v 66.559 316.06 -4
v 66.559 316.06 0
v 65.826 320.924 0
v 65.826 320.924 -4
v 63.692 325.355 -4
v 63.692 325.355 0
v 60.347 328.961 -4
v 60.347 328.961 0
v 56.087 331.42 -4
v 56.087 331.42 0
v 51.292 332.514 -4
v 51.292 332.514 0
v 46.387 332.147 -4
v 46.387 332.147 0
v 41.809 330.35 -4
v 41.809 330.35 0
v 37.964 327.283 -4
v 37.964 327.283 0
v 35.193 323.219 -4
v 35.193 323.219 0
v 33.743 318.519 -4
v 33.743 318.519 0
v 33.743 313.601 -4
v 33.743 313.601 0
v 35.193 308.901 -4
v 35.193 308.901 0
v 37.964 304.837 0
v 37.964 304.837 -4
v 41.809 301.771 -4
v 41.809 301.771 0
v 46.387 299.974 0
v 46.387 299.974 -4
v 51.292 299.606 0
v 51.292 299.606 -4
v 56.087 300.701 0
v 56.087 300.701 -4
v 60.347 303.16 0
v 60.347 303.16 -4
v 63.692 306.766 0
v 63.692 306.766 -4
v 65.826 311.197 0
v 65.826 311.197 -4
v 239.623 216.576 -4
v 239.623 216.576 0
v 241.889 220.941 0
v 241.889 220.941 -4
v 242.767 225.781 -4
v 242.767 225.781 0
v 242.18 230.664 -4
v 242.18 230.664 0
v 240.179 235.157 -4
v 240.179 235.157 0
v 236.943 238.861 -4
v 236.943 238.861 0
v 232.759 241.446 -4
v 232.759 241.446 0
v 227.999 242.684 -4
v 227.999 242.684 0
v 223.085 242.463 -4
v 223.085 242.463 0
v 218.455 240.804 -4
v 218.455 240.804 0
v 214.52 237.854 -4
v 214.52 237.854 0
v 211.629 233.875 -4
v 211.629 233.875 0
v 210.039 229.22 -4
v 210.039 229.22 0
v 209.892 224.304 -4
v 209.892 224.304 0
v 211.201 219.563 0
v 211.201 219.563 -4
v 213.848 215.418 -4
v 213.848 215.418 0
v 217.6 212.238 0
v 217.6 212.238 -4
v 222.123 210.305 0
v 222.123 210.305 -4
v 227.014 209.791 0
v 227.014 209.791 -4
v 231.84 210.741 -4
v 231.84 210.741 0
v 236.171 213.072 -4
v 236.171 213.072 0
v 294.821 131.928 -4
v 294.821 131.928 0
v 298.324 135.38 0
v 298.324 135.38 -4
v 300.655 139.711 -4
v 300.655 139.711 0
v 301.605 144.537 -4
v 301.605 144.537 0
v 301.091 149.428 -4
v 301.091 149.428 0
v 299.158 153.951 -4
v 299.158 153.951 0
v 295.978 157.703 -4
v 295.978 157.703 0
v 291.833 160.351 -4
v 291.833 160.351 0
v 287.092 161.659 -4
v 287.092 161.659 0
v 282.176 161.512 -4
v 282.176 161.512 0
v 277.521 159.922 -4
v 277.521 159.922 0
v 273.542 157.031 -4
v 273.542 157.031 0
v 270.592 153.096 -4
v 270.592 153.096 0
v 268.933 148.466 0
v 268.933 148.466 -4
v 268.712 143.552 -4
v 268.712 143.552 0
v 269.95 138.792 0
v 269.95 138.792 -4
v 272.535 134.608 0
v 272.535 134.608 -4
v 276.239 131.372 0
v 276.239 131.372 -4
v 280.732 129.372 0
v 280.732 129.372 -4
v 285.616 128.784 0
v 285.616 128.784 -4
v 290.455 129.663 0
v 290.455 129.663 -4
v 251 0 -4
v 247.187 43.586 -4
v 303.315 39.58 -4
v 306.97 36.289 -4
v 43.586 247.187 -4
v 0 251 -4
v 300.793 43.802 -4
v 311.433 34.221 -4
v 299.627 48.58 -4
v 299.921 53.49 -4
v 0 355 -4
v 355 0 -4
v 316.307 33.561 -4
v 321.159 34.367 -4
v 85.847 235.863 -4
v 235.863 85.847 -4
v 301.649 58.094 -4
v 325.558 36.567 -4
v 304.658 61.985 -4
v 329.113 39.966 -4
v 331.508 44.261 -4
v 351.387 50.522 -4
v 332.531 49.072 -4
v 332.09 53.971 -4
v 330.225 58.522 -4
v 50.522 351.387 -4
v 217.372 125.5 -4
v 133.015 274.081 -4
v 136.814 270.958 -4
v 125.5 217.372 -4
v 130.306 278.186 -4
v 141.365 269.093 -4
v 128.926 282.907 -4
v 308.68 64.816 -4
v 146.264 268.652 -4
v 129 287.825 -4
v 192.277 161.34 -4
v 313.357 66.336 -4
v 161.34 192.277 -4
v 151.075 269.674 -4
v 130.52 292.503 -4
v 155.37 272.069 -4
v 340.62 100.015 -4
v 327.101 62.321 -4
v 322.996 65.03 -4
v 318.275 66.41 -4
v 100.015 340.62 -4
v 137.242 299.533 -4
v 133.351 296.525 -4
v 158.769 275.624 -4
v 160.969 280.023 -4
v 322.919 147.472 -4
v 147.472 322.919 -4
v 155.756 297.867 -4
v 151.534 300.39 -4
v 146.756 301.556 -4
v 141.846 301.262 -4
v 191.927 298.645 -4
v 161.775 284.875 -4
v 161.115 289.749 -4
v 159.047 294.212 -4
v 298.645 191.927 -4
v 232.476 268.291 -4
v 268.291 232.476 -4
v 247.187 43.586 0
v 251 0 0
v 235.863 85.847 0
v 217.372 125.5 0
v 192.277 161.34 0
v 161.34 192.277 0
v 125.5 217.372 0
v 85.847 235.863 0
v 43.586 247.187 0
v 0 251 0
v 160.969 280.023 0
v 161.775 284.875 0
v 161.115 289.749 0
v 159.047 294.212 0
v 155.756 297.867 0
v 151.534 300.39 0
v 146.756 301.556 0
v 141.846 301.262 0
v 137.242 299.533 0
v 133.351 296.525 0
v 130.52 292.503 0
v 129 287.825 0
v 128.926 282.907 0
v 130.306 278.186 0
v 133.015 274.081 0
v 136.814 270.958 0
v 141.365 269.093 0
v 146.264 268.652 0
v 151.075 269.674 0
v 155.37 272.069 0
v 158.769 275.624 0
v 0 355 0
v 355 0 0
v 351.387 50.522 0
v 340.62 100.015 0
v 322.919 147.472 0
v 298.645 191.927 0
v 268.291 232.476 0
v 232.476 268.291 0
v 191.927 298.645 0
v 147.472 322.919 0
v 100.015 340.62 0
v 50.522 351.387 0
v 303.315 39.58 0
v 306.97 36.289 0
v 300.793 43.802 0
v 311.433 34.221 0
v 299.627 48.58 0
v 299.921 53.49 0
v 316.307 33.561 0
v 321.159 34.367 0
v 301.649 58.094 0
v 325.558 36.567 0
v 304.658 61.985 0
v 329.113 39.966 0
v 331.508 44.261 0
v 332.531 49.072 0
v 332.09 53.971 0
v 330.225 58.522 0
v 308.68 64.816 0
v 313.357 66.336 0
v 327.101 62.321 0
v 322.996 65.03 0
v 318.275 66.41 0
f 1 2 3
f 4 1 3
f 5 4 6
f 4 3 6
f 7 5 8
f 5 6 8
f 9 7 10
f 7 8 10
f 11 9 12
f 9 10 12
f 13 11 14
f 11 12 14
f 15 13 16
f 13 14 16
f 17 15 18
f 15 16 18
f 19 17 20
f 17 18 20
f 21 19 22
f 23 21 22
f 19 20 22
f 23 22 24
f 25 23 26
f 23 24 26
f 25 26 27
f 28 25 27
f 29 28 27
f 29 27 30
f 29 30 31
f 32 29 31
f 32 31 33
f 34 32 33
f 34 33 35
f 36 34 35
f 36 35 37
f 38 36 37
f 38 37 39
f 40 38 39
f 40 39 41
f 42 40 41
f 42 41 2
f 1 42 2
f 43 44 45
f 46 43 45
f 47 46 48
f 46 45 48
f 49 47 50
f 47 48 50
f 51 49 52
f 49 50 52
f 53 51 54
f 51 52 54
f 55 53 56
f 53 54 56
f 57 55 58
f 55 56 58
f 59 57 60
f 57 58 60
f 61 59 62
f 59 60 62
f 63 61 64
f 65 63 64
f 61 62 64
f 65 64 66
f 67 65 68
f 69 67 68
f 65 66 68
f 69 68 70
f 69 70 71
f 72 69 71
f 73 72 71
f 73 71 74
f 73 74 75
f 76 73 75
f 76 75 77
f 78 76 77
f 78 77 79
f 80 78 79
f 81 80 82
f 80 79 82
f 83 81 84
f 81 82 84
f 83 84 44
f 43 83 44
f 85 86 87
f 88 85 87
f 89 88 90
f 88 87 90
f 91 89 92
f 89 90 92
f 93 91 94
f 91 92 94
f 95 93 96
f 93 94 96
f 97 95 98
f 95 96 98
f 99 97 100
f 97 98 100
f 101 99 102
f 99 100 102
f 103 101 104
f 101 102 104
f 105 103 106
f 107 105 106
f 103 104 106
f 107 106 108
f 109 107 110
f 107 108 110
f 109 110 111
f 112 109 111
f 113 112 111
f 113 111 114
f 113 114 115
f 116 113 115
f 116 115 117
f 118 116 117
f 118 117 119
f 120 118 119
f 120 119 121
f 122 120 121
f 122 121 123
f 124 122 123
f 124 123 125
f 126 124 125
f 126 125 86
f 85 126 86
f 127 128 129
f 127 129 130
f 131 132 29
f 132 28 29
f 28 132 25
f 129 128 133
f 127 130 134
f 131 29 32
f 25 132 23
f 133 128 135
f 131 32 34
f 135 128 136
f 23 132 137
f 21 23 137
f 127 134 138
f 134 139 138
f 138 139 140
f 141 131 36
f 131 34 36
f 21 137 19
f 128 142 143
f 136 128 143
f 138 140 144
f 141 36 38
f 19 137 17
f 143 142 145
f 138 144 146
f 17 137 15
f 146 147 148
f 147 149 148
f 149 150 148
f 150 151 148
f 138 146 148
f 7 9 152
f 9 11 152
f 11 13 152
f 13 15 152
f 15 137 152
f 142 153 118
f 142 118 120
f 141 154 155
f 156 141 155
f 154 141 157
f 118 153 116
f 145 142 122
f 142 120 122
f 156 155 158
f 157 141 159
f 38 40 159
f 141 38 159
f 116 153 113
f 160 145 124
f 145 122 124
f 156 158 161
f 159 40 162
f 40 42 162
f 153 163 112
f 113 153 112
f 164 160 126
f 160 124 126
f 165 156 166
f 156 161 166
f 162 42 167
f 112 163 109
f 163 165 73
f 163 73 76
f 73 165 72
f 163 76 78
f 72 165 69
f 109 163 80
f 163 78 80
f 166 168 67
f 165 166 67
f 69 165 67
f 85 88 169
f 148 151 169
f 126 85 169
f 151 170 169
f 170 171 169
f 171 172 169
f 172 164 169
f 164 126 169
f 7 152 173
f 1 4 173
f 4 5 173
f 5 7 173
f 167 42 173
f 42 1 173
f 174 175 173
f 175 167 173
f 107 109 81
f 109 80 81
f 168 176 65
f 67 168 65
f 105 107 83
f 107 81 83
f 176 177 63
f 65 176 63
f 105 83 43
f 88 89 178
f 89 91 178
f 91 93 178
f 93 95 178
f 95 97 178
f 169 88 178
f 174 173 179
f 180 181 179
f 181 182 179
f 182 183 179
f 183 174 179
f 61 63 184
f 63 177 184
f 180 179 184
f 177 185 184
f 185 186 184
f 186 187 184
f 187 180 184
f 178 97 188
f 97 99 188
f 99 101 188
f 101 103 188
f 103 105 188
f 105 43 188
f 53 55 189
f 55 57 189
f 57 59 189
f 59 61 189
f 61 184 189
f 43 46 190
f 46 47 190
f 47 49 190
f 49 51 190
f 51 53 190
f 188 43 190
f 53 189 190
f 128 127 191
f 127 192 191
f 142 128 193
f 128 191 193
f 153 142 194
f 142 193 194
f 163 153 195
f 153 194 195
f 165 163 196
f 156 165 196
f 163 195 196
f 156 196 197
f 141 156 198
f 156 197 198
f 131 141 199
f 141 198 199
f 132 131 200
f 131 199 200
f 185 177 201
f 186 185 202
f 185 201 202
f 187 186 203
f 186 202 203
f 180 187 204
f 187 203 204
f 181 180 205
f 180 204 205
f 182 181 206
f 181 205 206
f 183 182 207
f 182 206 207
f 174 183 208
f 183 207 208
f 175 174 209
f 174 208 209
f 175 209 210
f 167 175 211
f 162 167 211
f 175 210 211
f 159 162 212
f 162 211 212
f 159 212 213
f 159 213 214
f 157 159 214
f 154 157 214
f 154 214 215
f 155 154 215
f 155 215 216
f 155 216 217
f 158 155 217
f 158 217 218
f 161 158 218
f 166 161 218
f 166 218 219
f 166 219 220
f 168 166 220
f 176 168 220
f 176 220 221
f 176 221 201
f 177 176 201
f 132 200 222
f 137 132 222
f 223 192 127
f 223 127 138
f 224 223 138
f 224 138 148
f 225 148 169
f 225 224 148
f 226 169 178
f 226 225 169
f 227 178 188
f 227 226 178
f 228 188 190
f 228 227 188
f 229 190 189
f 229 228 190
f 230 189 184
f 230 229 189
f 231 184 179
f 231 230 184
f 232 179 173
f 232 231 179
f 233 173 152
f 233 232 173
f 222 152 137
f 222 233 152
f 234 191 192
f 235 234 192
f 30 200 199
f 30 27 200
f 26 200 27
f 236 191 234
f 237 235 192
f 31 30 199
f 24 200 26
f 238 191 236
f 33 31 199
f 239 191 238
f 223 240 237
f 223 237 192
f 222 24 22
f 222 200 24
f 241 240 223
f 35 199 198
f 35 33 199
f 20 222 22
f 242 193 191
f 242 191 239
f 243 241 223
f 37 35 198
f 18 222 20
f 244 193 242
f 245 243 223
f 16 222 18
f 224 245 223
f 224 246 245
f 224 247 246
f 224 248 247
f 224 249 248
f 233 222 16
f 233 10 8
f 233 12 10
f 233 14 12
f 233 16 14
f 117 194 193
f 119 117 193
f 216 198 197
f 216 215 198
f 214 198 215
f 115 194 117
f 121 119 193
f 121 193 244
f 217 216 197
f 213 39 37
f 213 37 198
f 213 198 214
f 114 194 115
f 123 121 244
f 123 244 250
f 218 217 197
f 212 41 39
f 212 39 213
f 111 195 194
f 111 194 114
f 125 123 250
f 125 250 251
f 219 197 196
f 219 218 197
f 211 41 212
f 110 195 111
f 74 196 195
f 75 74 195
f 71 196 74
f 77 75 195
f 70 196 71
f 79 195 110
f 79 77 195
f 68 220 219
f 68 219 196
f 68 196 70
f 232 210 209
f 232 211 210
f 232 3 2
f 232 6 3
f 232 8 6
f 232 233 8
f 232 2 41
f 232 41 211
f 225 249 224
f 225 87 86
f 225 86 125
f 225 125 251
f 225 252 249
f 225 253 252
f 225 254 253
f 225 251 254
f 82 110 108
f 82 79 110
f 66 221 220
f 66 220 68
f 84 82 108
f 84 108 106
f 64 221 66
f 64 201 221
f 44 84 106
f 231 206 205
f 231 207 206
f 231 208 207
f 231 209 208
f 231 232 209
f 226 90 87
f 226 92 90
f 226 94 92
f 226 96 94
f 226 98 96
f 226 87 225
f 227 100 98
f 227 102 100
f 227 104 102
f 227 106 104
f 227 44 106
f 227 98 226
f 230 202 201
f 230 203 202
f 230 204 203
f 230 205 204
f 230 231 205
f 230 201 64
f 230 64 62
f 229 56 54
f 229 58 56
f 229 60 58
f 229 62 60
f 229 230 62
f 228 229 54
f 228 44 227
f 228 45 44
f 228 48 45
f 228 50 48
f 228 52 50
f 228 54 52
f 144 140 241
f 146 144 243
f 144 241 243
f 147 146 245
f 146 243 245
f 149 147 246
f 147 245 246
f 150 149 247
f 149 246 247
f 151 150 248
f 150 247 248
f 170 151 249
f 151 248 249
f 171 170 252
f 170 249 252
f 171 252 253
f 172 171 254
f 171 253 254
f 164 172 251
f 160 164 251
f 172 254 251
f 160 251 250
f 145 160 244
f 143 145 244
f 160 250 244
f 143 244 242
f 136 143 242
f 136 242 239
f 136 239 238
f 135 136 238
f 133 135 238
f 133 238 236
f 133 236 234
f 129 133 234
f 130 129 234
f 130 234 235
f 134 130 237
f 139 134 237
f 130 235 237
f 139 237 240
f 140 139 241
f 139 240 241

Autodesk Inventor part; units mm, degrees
ref_plane "YZ Plane" through (0, 0, 0) normal (1, 0, 0) x (0, 1, 0)
ref_plane "XZ Plane" through (0, 0, 0) normal (0, 1, 0) x (-1, 0, 0)
ref_plane "XY Plane" through (0, 0, 0) normal (0, 0, 1) x (1, 0, 0)
sketch "Sketch1" plane through (0, 0, 0) normal (0, 0, 1) x (1, 0, 0)
  arc A0 (251, 0) -> (0, 251) centre (0, 0) ccw
  arc A1 (0, 355) -> (355, 0) centre (0, 0) ccw construction
  circle A2 centre (0, 0) radius 320 construction
  line L0 (0, 0) -> (0, 251) construction
  line L1 (0, 0) -> (251, 0) construction
  arc A3 (355, 0) -> (0, 355) centre (0, 0) ccw
  line L2 (0, 251) -> (0, 355)
  arc A4 (0, 251) -> (251, 0) centre (0, 0) ccw construction
  line L3 (251, 0) -> (355, 0)
  dimension "d0" = 502
  dimension "d1" = 710
  dimension "d2" = 640
extrude "Plate1" add sketch "Sketch1" against normal blind 4
sketch "Sketch3" plane through (0, 0, 0) normal (0, 0, 1) x (1, 0, 0)
  circle A0 centre (0, 0) radius 320 construction
  line L0 (0, 0) -> (0, 355) construction
  arc A1 (355, 0) -> (0, 355) centre (0, 0) ccw projected
  line L1 (0, 0) -> (55.5342, 350.6294) construction
  circle A2 centre (50.059, 316.0603) radius 16.5
  dimension "d12" = 640
  dimension "d13" = 9
  dimension "d14" = 33
extrude "Extrusion2" cut sketch "Sketch3" against normal through all
pattern_circular "Circular Pattern1" count 5 over 72 about axis through (0, 0, -10) along (0, 0, -1) of "Extrusion2"
equation "\"d5\" = Thickness"
equation "\"BendReliefWidth\" = Thickness"
equation "\"BendReliefDepth\" = 0.5 * Thickness"
equation "\"CornerReliefSize\" = 4 * Thickness"
equation "\"MinimumRemnant\" = 2 * Thickness"
equation "\"TransitionRadius\" = BendRadius"
equation "\"JacobiRadiusSize\" = BendRadius"
equation "\"GapSize\" = Thickness"
equation "\"Thickness\" = 4"
equation "\"BendRadius\" = 6"
properties part number "MSC 036 flange 500" material "Stainless Steel"
